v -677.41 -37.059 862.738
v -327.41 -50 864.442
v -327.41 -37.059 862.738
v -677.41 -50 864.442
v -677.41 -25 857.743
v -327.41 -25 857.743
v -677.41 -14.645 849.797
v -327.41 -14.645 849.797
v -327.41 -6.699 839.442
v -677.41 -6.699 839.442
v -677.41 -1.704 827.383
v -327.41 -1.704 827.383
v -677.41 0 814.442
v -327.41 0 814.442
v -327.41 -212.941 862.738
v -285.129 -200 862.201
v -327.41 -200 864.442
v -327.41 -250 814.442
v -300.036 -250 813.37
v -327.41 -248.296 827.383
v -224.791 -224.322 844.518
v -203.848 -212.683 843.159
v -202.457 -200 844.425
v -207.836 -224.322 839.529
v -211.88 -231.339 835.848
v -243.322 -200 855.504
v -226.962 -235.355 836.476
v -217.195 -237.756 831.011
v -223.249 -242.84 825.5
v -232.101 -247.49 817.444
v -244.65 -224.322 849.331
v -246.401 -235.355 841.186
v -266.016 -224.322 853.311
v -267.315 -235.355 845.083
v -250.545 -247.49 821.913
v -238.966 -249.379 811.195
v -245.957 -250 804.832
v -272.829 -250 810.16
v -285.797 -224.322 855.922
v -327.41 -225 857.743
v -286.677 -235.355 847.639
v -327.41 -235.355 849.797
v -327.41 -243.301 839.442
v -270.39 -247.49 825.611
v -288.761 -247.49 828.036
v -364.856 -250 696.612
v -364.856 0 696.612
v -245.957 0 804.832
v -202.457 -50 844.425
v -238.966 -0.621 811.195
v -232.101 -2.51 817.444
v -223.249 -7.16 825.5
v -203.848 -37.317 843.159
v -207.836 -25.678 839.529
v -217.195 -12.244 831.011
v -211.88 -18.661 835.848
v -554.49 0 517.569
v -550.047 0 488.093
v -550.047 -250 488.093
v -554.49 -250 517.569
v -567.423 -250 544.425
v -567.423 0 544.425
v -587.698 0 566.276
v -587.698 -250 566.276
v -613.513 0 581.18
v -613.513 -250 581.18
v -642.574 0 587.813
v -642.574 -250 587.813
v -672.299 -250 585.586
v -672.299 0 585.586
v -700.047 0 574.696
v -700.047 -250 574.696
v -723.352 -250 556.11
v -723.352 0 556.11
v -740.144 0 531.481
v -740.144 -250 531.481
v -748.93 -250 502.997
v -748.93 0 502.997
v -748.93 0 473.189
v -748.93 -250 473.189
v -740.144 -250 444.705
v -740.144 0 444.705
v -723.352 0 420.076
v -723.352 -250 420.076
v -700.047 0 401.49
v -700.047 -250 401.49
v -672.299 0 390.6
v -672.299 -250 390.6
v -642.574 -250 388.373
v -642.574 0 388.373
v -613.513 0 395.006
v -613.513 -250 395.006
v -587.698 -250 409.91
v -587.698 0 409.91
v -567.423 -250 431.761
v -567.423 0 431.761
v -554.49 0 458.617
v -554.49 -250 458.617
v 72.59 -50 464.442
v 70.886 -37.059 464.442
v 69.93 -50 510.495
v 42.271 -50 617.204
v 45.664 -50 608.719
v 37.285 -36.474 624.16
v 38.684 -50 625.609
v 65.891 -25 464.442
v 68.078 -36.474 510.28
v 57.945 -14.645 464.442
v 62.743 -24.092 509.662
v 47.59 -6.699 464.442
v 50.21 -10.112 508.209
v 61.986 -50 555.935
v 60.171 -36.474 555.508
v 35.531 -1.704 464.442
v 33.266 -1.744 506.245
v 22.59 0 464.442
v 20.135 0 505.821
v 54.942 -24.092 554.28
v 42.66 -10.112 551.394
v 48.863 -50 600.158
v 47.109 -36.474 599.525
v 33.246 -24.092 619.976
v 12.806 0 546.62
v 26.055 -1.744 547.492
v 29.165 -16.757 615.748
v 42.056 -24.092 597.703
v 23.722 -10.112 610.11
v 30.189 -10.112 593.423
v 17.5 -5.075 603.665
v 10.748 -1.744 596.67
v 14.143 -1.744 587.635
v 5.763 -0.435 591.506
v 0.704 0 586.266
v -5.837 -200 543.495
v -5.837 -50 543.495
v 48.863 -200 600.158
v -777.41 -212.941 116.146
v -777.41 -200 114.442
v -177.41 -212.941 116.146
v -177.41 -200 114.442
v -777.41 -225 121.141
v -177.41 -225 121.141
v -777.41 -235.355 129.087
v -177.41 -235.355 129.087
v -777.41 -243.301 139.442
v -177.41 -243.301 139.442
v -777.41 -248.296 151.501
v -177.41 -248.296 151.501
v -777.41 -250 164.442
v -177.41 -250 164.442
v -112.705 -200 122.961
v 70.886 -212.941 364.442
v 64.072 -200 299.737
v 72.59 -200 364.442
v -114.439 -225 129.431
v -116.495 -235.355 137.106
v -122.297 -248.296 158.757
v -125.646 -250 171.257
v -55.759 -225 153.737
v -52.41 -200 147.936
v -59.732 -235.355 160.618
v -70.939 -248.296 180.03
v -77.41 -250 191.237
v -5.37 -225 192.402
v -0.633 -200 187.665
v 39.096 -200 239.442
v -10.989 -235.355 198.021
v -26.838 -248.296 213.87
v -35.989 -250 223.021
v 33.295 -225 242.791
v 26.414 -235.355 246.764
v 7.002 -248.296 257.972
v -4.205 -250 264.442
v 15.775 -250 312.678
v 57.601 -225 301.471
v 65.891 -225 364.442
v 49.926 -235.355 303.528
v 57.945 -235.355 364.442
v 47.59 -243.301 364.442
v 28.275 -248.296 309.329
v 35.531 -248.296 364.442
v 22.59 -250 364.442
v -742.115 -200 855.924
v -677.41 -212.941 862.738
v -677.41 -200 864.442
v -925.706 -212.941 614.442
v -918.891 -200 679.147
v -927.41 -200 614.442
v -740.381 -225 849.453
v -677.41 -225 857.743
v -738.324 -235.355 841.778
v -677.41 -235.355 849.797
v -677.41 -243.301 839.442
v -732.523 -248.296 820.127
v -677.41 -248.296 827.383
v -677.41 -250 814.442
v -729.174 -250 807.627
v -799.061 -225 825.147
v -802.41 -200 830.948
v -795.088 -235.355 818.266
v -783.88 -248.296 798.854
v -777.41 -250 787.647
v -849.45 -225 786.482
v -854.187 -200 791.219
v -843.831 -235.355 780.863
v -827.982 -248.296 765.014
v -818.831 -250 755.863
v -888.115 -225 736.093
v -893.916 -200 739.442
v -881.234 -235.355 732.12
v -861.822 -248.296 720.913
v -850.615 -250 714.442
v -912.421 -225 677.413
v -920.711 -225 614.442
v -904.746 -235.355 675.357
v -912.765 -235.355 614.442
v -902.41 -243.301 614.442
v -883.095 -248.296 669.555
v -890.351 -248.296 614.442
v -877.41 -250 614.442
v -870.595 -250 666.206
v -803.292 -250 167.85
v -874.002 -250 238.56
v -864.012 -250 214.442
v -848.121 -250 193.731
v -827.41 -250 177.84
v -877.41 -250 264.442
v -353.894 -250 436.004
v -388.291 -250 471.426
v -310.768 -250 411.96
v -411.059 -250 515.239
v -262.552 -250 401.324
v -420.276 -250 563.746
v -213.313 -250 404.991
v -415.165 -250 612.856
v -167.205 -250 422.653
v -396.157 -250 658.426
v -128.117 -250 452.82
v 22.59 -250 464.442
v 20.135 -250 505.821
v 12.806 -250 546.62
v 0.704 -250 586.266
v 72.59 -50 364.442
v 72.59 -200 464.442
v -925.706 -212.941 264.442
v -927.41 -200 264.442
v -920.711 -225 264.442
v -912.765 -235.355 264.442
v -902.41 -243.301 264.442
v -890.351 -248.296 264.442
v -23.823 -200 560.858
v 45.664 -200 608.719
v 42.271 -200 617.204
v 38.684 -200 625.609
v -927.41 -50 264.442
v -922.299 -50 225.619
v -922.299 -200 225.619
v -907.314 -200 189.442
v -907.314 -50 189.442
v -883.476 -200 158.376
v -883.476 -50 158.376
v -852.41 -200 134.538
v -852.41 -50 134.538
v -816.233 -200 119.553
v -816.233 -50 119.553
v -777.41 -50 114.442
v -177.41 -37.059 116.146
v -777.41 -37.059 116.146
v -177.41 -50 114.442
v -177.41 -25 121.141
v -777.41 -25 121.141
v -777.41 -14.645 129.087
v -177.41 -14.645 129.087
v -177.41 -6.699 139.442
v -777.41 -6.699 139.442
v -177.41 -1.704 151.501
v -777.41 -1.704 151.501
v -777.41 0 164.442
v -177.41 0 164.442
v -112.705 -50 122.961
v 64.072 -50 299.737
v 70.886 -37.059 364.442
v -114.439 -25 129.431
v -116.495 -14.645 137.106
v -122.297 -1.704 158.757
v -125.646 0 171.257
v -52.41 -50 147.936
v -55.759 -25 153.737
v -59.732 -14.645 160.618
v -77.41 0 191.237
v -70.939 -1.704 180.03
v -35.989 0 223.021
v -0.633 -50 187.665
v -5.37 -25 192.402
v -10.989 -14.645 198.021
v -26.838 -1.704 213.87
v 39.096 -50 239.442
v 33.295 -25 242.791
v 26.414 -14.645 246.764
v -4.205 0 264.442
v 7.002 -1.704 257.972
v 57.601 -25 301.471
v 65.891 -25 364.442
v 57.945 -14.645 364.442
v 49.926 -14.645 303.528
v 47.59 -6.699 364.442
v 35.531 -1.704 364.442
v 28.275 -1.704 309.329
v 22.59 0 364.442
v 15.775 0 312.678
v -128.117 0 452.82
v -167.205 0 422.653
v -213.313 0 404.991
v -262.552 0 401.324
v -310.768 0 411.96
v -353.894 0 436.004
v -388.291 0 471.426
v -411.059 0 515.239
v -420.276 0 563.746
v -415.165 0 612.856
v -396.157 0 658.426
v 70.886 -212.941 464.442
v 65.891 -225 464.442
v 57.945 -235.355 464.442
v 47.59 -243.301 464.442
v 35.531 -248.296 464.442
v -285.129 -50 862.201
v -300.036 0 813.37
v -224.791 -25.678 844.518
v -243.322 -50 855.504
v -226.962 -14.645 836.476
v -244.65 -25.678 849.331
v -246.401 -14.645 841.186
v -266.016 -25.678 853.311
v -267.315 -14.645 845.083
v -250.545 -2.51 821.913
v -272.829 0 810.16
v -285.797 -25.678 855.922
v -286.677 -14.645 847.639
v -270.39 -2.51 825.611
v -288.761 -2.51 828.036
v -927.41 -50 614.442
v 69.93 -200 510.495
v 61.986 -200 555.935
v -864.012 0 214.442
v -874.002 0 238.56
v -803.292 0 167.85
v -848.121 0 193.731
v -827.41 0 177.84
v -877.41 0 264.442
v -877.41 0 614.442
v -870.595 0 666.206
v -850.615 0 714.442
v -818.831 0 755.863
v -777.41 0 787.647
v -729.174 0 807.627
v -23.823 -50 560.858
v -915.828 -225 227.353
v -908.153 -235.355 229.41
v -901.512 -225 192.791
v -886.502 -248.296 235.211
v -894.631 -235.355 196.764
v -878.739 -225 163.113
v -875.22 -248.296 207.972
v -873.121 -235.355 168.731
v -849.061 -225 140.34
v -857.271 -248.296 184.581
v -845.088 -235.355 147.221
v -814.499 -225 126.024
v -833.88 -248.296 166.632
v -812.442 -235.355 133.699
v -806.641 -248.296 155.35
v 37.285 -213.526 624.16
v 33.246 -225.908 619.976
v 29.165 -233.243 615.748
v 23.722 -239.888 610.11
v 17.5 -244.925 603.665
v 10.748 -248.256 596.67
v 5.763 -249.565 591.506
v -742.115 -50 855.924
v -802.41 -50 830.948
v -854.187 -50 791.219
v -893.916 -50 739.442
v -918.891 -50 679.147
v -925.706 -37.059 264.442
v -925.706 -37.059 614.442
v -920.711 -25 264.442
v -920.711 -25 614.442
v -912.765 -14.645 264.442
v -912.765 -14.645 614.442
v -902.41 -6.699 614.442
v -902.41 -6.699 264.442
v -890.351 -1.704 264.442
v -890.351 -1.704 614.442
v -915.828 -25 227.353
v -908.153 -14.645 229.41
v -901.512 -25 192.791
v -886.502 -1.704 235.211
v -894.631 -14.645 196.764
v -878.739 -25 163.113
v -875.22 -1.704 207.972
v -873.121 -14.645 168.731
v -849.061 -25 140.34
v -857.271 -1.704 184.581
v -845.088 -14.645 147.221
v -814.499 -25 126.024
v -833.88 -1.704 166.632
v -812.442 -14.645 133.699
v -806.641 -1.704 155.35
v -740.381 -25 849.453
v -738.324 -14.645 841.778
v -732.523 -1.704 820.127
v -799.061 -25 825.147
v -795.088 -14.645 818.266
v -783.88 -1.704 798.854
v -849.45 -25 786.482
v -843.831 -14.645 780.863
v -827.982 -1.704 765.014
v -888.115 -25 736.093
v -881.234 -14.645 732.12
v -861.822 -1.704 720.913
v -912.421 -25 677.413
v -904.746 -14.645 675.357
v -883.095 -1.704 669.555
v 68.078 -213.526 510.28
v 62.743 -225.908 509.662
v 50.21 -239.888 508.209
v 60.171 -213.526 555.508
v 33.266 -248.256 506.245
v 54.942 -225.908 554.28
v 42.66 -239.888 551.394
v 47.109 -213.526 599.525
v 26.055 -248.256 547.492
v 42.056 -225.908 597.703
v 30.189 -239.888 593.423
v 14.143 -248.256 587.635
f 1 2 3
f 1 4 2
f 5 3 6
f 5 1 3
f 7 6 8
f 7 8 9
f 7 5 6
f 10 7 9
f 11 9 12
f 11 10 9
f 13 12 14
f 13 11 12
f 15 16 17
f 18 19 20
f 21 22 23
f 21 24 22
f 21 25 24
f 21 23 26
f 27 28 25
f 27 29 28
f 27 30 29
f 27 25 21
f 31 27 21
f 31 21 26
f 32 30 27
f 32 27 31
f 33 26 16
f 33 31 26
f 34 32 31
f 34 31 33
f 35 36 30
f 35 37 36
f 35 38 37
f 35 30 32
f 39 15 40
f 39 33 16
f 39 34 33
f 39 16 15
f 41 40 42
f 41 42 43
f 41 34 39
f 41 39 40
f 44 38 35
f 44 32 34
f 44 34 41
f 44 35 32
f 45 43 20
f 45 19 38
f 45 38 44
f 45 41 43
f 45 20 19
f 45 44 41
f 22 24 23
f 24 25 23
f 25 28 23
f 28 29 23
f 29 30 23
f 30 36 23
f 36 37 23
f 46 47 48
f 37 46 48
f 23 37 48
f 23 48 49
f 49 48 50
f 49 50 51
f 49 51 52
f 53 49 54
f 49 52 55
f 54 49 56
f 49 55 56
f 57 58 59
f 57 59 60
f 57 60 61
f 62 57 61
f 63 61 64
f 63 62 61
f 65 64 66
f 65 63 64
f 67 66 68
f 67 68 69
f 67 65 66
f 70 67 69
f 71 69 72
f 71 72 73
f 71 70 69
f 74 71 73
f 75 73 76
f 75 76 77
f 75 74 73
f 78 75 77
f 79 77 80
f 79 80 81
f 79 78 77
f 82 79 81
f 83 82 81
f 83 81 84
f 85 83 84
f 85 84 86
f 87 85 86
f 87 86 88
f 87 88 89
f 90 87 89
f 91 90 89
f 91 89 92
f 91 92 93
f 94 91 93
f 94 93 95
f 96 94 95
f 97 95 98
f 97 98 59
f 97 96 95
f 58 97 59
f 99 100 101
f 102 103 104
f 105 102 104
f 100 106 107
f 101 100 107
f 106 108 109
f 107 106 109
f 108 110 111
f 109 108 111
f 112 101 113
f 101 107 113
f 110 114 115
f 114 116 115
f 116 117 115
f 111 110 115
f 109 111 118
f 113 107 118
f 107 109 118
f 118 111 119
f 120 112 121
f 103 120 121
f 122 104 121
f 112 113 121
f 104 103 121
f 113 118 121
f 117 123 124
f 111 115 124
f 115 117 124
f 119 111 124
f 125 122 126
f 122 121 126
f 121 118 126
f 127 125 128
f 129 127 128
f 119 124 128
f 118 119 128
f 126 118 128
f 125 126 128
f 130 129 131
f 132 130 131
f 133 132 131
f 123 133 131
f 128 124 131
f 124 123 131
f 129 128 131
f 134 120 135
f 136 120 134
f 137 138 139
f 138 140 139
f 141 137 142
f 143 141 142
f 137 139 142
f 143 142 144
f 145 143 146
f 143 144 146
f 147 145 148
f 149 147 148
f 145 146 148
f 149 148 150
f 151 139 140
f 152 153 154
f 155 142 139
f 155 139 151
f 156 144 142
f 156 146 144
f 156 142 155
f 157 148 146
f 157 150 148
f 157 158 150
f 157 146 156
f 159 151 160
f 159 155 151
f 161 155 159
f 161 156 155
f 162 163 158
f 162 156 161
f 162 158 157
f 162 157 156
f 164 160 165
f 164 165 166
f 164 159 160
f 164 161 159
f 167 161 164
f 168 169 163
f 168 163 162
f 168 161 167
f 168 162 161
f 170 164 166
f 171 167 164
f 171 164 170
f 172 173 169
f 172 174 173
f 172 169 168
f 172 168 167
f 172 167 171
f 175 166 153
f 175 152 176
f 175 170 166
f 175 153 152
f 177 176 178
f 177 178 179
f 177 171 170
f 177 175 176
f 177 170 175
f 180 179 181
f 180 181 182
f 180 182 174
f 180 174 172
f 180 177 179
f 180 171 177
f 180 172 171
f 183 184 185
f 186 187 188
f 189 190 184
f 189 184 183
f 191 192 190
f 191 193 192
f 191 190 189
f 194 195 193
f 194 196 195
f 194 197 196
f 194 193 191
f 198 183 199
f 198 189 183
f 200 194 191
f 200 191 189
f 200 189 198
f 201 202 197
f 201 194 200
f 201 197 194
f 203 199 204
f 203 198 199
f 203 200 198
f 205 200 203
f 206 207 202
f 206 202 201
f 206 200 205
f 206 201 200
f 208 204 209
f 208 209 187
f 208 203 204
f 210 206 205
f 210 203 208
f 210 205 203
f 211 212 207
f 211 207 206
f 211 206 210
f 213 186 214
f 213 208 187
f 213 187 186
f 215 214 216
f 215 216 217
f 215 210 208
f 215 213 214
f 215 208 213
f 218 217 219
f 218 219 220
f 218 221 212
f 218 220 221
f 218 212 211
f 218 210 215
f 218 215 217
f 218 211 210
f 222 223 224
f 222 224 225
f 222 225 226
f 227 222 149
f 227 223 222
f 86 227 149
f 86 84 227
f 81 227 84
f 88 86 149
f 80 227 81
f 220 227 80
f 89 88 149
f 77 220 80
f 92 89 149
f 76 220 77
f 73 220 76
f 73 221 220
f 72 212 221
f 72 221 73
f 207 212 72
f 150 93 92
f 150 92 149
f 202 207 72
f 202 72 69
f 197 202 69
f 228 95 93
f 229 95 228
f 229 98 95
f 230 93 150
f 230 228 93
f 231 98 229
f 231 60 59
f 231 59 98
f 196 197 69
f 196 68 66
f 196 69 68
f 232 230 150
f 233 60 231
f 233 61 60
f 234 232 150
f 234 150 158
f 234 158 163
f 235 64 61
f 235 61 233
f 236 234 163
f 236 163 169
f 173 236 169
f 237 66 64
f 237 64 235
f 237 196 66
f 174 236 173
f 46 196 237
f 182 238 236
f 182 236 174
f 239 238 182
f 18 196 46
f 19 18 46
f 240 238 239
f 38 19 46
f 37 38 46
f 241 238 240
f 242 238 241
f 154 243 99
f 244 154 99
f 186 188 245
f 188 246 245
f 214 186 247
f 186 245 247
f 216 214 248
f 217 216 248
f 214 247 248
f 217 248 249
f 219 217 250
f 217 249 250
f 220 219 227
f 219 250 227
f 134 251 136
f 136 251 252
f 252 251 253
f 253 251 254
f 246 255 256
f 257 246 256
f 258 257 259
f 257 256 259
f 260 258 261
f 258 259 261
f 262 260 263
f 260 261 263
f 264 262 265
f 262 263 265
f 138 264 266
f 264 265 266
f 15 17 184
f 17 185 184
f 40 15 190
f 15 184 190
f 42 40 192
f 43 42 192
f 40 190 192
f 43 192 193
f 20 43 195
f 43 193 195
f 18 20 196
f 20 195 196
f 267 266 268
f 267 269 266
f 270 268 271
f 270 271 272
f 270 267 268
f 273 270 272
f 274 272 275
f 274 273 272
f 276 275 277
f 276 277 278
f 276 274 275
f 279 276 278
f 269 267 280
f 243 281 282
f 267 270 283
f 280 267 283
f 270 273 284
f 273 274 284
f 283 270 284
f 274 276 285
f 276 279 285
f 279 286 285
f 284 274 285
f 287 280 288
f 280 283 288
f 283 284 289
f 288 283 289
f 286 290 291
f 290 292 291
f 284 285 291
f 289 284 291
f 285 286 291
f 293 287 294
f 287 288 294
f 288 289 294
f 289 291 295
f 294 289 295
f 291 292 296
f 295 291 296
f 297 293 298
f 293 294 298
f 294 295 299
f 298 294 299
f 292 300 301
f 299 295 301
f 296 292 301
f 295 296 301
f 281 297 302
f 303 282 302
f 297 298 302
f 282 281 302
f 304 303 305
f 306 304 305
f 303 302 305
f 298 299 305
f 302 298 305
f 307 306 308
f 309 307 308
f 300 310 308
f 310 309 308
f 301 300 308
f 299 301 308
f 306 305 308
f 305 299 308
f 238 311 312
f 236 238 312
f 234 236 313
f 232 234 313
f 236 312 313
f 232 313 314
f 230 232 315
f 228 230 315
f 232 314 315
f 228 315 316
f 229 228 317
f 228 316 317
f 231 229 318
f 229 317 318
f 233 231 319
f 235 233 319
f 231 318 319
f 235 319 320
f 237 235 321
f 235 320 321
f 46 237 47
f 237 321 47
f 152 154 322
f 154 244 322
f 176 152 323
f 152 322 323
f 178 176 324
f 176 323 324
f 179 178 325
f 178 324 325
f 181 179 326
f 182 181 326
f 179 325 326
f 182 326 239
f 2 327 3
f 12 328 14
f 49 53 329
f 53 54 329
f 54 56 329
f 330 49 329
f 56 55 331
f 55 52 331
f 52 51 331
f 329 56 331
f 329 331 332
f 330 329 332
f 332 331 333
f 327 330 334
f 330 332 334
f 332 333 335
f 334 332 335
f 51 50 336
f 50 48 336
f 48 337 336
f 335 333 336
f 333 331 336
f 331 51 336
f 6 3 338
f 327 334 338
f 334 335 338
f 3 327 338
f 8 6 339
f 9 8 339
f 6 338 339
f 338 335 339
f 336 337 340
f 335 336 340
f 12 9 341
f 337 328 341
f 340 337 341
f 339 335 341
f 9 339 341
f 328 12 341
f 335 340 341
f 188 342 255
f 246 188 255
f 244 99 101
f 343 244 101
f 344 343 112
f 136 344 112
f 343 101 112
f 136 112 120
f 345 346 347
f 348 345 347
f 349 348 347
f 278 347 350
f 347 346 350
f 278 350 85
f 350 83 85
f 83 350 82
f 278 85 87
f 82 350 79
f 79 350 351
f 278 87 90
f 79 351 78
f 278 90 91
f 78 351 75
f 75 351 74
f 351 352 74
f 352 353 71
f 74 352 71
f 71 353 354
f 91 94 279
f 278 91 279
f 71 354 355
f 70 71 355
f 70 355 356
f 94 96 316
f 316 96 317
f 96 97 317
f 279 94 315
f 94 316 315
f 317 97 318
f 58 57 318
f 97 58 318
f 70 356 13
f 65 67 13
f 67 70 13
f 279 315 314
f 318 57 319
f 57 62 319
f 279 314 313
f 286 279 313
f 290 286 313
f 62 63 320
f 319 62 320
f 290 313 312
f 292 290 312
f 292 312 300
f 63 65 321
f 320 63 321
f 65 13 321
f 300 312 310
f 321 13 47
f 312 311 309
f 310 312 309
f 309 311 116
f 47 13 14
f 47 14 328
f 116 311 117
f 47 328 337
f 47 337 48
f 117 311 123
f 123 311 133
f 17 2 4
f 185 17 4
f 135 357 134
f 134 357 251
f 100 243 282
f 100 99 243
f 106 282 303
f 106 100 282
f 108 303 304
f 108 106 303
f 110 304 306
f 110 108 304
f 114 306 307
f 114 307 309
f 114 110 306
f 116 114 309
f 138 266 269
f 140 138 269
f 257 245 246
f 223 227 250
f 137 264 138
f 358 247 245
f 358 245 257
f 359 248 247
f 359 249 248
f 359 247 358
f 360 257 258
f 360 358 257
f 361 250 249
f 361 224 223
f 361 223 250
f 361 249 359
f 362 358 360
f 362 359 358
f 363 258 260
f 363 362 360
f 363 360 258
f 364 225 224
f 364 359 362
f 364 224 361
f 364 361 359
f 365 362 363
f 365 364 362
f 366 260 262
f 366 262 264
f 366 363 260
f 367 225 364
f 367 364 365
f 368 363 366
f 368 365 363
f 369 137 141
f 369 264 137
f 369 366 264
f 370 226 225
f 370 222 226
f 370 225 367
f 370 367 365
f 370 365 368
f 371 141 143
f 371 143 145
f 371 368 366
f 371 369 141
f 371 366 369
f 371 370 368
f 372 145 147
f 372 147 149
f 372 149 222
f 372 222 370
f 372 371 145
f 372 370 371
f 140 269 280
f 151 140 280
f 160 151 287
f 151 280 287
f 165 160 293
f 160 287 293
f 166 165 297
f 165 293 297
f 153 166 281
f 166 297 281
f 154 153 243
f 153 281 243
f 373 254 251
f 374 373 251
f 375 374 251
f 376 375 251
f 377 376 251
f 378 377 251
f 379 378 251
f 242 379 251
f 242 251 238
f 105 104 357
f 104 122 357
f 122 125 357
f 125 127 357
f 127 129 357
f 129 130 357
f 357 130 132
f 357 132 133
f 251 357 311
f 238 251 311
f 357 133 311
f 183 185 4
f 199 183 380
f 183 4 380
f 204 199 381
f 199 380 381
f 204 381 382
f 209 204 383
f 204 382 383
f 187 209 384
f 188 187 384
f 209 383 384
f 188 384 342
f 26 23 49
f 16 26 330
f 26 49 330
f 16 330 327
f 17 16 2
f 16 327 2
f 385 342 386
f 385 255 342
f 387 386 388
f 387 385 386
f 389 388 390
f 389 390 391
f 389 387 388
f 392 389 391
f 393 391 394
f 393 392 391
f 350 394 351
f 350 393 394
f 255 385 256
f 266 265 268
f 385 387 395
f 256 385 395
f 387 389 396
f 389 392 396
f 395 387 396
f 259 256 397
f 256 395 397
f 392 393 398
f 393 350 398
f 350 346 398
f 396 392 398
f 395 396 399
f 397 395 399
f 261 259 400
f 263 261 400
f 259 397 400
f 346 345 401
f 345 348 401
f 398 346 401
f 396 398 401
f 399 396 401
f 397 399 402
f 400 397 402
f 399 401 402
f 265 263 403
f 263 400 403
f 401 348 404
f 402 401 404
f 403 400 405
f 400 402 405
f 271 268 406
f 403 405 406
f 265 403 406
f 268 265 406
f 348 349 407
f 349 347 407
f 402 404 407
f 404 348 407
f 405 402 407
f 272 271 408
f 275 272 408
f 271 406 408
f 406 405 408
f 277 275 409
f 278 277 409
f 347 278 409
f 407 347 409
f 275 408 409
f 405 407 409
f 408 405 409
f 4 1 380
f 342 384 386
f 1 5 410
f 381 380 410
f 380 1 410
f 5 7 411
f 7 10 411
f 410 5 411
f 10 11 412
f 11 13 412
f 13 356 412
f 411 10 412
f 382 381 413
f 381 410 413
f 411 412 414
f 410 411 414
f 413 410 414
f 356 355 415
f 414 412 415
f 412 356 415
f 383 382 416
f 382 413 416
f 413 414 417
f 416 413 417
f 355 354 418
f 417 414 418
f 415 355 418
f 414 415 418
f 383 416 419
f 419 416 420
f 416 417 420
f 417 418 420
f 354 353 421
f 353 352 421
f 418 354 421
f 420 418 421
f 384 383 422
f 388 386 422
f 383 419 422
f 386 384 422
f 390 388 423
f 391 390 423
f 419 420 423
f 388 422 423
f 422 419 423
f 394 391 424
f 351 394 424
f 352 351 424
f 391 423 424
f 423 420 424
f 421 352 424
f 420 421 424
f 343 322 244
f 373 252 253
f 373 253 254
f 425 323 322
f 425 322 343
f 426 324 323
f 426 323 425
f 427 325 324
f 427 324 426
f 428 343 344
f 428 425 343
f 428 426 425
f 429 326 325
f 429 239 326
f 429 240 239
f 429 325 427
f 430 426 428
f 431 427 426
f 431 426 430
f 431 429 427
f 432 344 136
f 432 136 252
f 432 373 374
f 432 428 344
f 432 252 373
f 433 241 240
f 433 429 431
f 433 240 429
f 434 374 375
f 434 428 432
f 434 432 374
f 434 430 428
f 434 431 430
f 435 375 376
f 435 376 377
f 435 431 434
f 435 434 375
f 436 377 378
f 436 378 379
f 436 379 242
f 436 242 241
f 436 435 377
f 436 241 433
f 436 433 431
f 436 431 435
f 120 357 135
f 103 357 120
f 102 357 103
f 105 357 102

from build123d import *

# Parameters (mm, degrees)
F0_R     = 100
F1_DEPTH = 250
F2_R     = 50
F3_W     = 150
F3_H     = 90
F4_DEPTH = 25


with BuildPart() as f1:
    # F0 (on Front) → F1 (new body)
    with BuildSketch(Plane.XZ):
        with BuildLine():
            Line((-327.409887, 864.442099), (-677.409887, 864.442099))
            ThreePointArc((-677.409887, 864.442099), (-854.186583, 791.218795), (-927.409887, 614.442099))
            Line((-927.409887, 614.442099), (-927.409887, 264.442099))
            ThreePointArc((-927.409887, 264.442099), (-883.475904, 158.376082), (-777.409887, 114.442099))
            Line((-777.409887, 114.442099), (-177.409887, 114.442099))
            ThreePointArc((-177.409887, 114.442099), (-0.633192, 187.665404), (72.590113, 364.442099))
            Line((72.590113, 364.442099), (72.590113, 464.442099))
            ThreePointArc((72.590113, 464.442099), (64.021935, 546.789705), (38.684472, 625.609466))
            Line((38.684472, 625.609466), (-128.117229, 452.820158))
            ThreePointArc((-128.117229, 452.820158), (-372.385207, 452.459405), (-364.855767, 696.611577))
            Line((-364.855767, 696.611577), (-202.457301, 844.424798))
            ThreePointArc((-202.457301, 844.424798), (-264.136984, 859.406072), (-327.409887, 864.442099))
        make_face()
        with Locations((-650.047123, 488.092989)):
            Circle(F0_R, mode=Mode.SUBTRACT)
    extrude(amount=F1_DEPTH)

    # F2
    f2_edges = [f1.edges().sort_by_distance(p)[0] for p in [
        (-502.409887, -250, 864.442099),
        (-502.409887, 0, 864.442099),
    ]]
    fillet(f2_edges, radius=F2_R)

    # F3 (on face) → F4 (cut)
    with BuildSketch(Plane(origin=(-292.586202, 0, 282.447316), x_dir=(0, -1, 0), z_dir=(-0.719463, 0, 0.694531))):
        with Locations((125, 431.970147)):
            Rectangle(F3_W, F3_H)
    extrude(amount=-F4_DEPTH, mode=Mode.SUBTRACT)


solid = f1.part
